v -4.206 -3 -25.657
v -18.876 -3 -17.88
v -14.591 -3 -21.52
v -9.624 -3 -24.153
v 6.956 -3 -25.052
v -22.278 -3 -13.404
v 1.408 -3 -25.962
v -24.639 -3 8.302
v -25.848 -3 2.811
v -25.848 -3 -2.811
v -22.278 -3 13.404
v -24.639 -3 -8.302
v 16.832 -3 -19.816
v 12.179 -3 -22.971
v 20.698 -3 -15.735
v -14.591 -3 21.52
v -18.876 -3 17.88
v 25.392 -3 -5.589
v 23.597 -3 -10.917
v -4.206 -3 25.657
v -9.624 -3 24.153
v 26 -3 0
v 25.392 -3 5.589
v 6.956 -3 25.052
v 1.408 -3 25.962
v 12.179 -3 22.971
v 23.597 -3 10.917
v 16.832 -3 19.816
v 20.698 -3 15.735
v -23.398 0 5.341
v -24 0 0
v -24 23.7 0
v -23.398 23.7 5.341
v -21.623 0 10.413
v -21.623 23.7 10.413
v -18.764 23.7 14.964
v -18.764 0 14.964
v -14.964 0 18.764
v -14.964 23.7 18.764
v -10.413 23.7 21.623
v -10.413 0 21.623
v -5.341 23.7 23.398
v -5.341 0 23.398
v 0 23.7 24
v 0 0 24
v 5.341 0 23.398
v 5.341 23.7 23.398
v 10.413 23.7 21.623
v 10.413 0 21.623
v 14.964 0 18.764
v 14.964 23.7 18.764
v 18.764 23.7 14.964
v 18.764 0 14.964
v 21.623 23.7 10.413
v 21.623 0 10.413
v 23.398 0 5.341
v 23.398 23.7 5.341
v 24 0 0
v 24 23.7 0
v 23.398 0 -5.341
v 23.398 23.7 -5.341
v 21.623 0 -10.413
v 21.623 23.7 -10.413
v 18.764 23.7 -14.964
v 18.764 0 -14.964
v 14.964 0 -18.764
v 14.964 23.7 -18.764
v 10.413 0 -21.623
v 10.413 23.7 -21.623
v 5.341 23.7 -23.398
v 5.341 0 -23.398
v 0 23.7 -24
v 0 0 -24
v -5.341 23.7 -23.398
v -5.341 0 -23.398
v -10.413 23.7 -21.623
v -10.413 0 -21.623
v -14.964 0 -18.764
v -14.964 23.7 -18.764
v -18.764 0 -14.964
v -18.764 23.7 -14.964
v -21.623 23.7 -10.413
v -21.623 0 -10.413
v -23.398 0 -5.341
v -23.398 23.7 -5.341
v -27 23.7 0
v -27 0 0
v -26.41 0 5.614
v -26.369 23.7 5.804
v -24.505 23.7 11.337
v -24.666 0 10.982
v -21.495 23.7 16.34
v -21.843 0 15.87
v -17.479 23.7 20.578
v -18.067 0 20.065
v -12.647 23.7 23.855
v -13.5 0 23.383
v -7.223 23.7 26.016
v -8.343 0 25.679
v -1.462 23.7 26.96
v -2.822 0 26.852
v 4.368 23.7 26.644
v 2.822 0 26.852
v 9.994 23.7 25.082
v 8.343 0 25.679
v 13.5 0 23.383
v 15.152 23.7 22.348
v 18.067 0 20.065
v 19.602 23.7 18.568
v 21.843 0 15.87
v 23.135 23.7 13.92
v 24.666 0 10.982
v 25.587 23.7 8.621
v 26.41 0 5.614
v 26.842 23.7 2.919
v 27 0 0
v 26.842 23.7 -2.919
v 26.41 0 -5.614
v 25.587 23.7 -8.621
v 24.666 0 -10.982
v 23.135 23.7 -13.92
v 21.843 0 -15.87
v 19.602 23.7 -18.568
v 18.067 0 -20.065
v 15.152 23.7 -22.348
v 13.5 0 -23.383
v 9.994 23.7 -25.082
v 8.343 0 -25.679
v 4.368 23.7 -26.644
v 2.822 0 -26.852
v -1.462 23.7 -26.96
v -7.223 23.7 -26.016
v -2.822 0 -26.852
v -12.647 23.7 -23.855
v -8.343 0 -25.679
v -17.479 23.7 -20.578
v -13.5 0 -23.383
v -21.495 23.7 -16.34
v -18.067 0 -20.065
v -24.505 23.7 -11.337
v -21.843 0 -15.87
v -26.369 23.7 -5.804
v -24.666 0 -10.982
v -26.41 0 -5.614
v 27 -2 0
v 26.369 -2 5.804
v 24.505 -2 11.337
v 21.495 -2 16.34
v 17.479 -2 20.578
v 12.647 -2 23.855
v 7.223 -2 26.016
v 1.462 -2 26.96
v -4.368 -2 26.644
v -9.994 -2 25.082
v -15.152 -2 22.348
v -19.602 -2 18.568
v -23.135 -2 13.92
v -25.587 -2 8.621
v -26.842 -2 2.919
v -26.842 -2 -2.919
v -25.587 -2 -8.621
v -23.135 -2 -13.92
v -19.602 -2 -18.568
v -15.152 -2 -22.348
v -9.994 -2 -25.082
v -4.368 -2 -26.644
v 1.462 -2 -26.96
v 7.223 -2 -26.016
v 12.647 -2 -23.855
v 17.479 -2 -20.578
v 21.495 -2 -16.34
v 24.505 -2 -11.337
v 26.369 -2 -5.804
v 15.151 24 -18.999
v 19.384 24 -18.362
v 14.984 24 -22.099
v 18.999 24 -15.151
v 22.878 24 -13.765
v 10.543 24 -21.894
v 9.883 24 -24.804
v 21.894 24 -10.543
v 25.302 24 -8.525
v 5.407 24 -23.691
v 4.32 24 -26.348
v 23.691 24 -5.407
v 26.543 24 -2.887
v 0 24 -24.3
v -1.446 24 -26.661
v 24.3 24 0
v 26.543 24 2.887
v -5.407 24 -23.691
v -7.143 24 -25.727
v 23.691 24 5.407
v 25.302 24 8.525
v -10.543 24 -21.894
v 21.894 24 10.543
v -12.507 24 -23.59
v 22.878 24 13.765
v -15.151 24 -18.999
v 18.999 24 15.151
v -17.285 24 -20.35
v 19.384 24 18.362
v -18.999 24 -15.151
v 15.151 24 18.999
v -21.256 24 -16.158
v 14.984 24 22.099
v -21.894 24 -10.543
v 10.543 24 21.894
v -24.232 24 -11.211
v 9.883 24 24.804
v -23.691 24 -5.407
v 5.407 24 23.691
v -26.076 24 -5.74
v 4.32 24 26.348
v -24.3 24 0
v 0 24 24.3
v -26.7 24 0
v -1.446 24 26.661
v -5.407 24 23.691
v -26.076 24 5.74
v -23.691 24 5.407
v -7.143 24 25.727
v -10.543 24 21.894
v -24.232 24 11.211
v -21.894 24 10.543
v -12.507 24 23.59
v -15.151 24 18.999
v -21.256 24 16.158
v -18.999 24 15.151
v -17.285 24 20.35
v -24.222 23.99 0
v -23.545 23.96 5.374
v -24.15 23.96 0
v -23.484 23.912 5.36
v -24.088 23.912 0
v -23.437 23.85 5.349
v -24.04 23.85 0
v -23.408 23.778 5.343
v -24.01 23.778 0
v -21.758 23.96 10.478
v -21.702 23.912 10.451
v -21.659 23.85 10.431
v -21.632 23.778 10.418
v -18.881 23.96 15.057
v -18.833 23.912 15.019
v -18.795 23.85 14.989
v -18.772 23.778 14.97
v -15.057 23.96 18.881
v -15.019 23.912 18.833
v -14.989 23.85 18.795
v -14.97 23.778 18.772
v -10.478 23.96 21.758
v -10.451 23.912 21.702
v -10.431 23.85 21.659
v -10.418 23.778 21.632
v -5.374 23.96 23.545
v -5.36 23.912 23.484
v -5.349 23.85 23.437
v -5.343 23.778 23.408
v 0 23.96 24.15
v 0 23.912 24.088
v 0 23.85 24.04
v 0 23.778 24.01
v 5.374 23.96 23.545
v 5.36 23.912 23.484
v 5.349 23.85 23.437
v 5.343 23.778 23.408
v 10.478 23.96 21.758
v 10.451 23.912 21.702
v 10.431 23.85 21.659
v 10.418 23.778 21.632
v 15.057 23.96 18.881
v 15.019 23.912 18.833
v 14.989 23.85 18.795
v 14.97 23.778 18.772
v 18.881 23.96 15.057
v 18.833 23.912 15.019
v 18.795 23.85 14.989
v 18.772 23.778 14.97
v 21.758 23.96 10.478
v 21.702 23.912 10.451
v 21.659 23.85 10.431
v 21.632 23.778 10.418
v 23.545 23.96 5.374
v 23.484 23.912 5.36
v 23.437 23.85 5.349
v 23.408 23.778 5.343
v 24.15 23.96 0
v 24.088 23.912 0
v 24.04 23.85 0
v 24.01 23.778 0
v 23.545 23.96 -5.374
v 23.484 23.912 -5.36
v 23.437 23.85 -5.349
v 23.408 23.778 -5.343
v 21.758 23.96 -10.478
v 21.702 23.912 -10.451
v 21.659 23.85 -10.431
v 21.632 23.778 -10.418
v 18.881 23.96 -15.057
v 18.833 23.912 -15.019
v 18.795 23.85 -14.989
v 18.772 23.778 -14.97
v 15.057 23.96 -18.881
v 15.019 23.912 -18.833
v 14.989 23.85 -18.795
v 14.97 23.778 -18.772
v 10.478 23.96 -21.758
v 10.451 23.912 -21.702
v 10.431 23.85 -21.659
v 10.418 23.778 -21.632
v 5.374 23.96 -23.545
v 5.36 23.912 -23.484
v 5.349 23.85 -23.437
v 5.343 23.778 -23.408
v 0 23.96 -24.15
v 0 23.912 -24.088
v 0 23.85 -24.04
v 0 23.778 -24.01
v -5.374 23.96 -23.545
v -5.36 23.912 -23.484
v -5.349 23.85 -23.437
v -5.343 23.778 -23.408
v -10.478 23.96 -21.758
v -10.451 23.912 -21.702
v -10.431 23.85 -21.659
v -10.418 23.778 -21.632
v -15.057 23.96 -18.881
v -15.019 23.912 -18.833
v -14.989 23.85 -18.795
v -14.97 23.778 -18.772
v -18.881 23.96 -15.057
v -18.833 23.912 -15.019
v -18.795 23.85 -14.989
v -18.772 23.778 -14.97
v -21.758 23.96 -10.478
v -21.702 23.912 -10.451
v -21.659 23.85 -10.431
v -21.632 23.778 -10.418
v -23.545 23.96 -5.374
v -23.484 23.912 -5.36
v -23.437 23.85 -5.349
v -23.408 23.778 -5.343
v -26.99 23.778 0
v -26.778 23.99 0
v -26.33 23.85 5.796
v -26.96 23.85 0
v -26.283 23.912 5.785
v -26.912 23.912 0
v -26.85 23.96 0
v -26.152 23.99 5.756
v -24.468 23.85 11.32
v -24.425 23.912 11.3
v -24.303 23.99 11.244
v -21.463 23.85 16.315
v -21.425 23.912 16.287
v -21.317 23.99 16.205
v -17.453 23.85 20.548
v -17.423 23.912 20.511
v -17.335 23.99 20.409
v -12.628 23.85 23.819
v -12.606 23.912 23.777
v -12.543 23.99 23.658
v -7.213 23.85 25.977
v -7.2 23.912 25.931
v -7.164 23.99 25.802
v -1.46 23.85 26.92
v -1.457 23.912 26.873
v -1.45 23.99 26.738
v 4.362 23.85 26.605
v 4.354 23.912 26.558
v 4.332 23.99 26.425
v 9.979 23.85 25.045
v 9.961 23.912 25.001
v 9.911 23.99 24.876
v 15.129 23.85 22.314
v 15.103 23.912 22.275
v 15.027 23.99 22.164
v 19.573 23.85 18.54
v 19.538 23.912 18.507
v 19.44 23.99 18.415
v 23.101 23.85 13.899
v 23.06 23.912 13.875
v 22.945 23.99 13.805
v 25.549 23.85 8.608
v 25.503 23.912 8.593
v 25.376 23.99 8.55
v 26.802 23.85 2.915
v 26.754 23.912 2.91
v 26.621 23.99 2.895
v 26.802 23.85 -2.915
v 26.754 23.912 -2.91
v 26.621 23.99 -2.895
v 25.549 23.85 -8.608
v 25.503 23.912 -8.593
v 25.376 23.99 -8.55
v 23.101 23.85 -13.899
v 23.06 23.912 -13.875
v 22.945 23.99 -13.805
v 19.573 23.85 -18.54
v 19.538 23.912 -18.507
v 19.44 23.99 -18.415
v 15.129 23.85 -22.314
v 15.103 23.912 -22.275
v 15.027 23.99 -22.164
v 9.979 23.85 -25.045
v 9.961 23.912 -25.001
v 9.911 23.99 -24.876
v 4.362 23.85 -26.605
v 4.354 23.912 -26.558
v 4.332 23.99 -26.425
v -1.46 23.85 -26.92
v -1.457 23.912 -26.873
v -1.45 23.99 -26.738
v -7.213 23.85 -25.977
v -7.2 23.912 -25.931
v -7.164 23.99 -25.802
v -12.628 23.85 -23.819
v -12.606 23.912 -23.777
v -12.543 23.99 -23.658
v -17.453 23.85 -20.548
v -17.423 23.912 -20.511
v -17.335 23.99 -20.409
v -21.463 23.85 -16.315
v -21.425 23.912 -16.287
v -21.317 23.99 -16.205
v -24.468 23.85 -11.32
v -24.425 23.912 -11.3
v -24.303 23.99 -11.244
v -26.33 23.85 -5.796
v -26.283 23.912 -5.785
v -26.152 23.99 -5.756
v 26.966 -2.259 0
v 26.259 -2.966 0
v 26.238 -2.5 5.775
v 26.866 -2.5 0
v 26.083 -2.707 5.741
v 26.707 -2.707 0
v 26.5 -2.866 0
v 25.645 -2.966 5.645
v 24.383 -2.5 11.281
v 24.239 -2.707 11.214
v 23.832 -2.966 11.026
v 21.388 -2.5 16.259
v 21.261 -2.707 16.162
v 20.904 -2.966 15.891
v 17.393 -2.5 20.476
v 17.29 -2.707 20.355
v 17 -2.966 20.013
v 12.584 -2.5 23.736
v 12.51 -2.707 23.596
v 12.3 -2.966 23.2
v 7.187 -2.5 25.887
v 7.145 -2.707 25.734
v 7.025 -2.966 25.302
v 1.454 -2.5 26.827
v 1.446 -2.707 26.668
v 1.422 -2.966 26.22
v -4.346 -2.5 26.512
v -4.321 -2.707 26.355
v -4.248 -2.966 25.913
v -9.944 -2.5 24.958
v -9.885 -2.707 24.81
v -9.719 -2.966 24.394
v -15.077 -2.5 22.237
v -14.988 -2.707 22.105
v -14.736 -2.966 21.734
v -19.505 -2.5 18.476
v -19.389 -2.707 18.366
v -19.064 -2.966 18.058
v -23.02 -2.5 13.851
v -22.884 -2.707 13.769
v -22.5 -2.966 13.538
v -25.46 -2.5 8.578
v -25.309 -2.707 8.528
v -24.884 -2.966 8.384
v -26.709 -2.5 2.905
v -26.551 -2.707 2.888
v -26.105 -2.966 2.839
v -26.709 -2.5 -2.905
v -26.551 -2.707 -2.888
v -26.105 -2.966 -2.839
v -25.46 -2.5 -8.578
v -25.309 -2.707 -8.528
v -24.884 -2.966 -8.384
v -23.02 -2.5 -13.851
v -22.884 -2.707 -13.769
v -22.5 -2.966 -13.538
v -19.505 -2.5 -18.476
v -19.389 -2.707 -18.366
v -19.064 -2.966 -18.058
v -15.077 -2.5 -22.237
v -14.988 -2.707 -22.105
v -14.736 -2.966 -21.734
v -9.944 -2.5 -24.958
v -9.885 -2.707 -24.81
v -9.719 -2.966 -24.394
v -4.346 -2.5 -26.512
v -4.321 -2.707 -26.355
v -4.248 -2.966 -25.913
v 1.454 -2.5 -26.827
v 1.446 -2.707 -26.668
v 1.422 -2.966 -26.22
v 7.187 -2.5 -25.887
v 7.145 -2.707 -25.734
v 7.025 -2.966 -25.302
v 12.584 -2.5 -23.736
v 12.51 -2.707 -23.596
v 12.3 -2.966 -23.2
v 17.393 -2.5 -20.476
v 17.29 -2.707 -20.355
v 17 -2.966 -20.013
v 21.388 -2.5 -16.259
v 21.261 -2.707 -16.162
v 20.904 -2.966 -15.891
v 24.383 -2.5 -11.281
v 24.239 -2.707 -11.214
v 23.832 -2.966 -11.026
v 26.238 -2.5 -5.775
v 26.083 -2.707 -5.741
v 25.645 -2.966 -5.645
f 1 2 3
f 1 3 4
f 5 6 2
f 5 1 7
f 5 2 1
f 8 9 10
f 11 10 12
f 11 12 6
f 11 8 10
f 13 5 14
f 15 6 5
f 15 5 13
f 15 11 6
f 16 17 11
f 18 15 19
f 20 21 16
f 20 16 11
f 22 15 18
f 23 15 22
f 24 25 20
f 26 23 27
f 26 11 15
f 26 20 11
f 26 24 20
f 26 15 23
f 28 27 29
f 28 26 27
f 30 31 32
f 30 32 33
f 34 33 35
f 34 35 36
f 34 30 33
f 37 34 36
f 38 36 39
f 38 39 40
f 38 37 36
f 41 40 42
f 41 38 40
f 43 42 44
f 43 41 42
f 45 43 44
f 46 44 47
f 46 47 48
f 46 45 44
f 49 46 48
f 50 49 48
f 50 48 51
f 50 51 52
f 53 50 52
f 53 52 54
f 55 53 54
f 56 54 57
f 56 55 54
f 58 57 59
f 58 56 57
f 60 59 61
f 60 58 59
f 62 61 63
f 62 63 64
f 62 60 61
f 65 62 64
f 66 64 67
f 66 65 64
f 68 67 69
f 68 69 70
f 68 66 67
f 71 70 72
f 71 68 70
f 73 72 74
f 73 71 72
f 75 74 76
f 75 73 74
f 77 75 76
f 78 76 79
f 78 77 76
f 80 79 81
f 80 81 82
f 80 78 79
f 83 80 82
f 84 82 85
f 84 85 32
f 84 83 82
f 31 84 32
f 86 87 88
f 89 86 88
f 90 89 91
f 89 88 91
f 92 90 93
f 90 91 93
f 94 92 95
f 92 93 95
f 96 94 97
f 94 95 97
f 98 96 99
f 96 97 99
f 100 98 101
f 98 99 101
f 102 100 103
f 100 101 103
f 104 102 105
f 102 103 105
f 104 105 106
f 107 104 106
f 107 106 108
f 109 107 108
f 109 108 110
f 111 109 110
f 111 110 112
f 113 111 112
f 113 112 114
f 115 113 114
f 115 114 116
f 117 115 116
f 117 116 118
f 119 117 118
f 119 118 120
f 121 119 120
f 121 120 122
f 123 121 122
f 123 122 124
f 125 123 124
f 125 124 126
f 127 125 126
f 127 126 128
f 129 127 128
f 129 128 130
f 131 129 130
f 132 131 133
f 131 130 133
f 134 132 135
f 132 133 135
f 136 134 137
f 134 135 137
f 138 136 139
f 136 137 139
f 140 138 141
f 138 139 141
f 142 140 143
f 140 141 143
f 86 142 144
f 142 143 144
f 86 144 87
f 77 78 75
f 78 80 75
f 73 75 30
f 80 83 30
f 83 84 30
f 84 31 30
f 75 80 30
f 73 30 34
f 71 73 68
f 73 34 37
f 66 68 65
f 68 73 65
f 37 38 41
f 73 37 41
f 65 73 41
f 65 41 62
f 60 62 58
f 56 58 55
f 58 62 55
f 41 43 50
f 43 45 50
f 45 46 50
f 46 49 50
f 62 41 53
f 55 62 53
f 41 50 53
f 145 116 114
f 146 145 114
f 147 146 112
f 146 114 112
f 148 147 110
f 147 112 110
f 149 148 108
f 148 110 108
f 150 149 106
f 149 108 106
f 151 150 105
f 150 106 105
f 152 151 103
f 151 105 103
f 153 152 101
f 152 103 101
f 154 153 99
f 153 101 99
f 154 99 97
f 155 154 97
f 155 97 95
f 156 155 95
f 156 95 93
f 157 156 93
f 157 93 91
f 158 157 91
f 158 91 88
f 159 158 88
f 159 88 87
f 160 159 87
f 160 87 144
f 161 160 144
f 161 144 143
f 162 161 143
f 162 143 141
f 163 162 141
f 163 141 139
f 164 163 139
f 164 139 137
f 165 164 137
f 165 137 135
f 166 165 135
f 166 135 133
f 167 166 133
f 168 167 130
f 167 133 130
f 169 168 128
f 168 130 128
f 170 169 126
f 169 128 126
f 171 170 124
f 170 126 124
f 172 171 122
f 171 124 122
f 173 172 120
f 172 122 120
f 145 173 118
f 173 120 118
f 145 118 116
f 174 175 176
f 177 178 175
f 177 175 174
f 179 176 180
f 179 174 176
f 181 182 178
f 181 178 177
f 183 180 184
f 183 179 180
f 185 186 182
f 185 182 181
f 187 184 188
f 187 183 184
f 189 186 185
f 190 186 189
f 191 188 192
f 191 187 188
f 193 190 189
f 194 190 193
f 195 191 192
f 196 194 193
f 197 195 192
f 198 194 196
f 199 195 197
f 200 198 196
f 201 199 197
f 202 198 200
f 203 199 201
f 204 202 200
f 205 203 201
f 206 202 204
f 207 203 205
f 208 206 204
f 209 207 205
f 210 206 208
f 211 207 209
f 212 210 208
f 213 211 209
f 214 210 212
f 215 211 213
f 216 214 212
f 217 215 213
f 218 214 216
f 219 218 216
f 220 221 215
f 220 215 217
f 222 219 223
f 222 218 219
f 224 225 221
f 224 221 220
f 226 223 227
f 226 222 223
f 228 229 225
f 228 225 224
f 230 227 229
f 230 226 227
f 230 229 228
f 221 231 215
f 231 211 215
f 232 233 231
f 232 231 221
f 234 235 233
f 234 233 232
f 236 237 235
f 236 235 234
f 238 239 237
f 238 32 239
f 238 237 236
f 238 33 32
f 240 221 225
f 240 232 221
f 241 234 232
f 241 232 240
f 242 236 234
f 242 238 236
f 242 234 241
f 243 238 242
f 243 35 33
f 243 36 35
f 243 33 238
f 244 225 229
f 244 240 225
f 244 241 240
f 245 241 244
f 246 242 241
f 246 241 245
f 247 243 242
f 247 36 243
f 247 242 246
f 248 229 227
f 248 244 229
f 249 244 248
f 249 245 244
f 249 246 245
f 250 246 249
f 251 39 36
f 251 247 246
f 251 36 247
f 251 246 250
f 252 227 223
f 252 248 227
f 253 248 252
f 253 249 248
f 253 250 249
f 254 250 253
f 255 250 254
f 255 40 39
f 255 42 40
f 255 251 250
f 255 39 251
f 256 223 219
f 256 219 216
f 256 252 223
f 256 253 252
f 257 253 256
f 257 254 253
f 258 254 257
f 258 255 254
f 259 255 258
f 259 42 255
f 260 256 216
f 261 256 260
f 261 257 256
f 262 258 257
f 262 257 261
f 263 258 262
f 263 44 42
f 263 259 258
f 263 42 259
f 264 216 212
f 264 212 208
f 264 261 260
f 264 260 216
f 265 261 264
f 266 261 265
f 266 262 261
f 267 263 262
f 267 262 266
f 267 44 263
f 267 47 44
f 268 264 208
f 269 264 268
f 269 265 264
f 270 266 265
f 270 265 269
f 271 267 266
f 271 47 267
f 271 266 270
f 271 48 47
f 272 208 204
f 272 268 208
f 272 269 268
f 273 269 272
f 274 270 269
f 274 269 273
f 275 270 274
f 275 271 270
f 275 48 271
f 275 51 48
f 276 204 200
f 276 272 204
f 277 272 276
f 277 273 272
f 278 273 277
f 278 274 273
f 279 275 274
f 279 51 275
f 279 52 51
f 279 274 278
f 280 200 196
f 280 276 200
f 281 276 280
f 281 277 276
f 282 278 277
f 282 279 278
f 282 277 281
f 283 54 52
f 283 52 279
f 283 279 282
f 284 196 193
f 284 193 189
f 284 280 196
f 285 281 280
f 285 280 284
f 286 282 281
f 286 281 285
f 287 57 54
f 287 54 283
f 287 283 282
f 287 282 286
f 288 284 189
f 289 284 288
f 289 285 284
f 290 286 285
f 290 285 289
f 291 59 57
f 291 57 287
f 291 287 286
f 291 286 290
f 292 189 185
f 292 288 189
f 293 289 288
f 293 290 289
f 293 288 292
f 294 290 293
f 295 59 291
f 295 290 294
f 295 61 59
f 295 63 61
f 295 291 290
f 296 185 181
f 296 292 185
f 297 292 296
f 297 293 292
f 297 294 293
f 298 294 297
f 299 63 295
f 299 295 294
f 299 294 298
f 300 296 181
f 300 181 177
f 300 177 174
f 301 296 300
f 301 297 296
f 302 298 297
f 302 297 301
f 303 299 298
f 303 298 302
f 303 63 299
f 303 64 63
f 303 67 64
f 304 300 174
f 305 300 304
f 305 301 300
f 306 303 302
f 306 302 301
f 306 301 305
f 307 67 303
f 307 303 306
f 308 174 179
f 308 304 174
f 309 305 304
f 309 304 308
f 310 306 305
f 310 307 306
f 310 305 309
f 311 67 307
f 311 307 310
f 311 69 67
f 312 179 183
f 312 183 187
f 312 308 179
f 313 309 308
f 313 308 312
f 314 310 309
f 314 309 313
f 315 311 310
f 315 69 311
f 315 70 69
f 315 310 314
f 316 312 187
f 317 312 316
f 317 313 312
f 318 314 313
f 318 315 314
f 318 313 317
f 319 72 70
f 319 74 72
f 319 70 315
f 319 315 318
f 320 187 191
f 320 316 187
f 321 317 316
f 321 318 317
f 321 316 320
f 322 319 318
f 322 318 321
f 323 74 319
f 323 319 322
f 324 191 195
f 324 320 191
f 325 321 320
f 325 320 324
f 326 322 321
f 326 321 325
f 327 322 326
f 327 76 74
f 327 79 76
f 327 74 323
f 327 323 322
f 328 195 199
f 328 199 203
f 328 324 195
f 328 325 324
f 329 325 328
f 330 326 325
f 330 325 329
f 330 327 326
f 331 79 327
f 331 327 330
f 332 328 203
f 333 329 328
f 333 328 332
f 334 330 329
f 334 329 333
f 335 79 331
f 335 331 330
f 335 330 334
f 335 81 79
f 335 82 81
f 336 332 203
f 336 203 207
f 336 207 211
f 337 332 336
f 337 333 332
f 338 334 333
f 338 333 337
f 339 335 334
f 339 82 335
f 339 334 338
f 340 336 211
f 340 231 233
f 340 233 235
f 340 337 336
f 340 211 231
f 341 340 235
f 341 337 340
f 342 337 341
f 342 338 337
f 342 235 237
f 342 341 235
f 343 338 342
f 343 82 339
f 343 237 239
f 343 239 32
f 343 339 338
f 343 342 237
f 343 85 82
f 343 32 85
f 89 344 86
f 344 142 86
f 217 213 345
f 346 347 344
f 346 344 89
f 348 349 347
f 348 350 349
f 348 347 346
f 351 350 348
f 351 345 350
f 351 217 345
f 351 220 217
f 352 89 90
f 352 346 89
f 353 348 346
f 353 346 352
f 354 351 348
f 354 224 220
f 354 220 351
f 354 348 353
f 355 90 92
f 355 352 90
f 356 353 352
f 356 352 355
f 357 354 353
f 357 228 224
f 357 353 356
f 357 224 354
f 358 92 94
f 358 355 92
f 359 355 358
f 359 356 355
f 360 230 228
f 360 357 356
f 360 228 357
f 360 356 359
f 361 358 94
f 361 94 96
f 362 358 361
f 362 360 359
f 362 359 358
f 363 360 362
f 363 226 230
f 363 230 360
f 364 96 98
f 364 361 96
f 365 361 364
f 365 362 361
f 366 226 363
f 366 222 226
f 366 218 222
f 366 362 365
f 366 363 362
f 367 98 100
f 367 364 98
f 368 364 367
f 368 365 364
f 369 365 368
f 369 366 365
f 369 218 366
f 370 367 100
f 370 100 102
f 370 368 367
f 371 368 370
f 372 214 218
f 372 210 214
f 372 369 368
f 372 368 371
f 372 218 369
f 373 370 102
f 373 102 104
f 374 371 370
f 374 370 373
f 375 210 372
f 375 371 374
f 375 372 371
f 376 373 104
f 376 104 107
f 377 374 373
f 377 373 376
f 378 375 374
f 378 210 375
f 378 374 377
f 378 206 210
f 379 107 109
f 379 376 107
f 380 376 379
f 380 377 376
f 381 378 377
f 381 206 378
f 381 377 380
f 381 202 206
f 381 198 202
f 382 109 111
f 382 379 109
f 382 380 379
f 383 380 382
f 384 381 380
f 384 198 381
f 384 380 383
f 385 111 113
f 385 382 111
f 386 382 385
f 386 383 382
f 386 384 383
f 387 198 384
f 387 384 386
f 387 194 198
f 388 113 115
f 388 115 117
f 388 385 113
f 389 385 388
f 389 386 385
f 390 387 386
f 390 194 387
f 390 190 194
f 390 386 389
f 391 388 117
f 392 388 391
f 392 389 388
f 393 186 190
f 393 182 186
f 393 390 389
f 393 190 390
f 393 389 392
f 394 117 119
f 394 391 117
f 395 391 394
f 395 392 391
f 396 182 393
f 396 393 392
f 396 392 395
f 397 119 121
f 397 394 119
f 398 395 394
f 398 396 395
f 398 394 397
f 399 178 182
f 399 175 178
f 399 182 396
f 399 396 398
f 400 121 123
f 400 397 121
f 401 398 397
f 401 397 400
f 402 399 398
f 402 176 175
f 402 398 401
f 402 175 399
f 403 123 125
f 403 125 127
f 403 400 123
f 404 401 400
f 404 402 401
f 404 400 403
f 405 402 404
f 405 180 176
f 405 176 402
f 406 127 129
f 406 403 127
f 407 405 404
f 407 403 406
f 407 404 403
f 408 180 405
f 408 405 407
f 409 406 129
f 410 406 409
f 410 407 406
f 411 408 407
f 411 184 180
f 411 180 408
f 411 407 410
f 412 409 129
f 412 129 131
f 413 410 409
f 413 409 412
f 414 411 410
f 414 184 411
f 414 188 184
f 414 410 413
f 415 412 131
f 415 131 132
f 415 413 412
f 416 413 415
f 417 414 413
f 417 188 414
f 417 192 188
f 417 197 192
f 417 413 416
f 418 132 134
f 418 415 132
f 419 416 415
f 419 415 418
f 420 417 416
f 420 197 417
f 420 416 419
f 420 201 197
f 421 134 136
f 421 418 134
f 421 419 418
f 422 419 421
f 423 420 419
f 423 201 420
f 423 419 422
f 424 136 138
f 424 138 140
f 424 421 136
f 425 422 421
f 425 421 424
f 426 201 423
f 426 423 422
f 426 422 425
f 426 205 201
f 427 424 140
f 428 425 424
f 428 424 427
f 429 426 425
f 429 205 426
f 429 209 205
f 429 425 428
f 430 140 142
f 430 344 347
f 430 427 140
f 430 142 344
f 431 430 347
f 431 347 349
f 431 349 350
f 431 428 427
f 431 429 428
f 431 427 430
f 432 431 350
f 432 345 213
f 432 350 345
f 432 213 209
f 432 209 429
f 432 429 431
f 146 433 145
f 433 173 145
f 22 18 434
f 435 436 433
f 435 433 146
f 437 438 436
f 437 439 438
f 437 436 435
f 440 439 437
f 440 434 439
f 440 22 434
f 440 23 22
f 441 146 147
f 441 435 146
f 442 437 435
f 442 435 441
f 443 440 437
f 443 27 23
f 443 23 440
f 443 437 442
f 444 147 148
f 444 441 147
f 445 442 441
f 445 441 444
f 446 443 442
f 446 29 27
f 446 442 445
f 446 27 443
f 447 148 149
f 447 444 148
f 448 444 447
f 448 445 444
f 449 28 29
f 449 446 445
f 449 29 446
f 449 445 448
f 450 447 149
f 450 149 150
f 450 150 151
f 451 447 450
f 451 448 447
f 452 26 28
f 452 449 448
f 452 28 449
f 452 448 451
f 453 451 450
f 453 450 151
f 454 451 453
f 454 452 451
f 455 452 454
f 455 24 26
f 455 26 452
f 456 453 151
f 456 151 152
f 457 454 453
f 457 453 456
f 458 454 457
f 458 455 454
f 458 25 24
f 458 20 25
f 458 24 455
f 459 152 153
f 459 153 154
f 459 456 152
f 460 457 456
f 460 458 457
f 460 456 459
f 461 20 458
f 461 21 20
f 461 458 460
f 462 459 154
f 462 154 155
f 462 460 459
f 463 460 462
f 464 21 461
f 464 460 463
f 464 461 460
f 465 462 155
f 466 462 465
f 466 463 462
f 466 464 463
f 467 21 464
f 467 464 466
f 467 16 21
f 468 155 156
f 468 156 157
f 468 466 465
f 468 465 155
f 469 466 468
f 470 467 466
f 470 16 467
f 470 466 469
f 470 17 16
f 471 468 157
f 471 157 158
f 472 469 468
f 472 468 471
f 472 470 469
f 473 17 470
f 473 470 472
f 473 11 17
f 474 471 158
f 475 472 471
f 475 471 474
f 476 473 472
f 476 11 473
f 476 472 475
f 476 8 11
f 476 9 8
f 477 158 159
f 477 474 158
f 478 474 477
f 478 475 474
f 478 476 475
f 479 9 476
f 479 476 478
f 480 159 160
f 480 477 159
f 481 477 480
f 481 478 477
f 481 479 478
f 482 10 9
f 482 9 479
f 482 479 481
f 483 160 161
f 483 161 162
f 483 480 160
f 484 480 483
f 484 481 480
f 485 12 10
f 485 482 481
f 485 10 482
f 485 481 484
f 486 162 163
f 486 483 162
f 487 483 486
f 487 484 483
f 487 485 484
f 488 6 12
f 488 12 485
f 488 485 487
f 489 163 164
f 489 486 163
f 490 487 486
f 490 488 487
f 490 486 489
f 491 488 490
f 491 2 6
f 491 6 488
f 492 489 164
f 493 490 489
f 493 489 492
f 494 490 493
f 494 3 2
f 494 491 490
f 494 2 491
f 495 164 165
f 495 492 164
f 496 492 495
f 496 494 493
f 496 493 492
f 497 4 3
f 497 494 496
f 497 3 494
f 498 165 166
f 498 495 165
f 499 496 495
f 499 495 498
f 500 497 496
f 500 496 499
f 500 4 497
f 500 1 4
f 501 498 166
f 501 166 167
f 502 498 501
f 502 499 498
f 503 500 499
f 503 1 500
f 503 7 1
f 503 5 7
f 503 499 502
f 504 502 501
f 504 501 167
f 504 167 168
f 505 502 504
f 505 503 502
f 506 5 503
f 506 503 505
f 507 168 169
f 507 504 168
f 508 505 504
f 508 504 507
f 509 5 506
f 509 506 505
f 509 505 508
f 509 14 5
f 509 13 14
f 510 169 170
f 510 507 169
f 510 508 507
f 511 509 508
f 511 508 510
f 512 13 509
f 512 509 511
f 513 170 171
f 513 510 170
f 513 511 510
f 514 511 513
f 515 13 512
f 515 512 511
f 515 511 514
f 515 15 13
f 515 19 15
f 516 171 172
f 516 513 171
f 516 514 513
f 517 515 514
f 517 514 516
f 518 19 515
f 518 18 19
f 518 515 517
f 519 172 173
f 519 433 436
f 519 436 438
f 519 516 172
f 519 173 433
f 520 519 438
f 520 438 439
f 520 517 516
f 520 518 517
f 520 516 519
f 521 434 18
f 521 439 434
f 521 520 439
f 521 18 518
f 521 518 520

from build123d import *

# Parameters (mm, degrees)
F0_R     = 27
F1_DEPTH = 3
F2_R     = 27
F2_R_2   = 24
F3_DEPTH = 24
F4_R     = 1
F5_R     = 0.3


with BuildPart() as f1:
    # F0 (on Front) → F1 (new body)
    with BuildSketch(Plane.XZ):
        Circle(F0_R)
    extrude(amount=F1_DEPTH)

    # F2 (on face) → F3 (join)
    with BuildSketch(Plane(origin=(0, 0, 0), x_dir=(-1, 0, 0), z_dir=(0, 1, 0))):
        Circle(F2_R)
        Circle(F2_R_2, mode=Mode.SUBTRACT)
    extrude(amount=F3_DEPTH)

    # F4
    f4_edges = [f1.edges().sort_by_distance(p)[0] for p in [
        (-27, -3, 0),
    ]]
    fillet(f4_edges, radius=F4_R)

    # F5
    f5_edges = [f1.edges().sort_by_distance(p)[0] for p in [
        (27, 24, 0),
        (24, 24, 0),
    ]]
    fillet(f5_edges, radius=F5_R)


solid = f1.part
